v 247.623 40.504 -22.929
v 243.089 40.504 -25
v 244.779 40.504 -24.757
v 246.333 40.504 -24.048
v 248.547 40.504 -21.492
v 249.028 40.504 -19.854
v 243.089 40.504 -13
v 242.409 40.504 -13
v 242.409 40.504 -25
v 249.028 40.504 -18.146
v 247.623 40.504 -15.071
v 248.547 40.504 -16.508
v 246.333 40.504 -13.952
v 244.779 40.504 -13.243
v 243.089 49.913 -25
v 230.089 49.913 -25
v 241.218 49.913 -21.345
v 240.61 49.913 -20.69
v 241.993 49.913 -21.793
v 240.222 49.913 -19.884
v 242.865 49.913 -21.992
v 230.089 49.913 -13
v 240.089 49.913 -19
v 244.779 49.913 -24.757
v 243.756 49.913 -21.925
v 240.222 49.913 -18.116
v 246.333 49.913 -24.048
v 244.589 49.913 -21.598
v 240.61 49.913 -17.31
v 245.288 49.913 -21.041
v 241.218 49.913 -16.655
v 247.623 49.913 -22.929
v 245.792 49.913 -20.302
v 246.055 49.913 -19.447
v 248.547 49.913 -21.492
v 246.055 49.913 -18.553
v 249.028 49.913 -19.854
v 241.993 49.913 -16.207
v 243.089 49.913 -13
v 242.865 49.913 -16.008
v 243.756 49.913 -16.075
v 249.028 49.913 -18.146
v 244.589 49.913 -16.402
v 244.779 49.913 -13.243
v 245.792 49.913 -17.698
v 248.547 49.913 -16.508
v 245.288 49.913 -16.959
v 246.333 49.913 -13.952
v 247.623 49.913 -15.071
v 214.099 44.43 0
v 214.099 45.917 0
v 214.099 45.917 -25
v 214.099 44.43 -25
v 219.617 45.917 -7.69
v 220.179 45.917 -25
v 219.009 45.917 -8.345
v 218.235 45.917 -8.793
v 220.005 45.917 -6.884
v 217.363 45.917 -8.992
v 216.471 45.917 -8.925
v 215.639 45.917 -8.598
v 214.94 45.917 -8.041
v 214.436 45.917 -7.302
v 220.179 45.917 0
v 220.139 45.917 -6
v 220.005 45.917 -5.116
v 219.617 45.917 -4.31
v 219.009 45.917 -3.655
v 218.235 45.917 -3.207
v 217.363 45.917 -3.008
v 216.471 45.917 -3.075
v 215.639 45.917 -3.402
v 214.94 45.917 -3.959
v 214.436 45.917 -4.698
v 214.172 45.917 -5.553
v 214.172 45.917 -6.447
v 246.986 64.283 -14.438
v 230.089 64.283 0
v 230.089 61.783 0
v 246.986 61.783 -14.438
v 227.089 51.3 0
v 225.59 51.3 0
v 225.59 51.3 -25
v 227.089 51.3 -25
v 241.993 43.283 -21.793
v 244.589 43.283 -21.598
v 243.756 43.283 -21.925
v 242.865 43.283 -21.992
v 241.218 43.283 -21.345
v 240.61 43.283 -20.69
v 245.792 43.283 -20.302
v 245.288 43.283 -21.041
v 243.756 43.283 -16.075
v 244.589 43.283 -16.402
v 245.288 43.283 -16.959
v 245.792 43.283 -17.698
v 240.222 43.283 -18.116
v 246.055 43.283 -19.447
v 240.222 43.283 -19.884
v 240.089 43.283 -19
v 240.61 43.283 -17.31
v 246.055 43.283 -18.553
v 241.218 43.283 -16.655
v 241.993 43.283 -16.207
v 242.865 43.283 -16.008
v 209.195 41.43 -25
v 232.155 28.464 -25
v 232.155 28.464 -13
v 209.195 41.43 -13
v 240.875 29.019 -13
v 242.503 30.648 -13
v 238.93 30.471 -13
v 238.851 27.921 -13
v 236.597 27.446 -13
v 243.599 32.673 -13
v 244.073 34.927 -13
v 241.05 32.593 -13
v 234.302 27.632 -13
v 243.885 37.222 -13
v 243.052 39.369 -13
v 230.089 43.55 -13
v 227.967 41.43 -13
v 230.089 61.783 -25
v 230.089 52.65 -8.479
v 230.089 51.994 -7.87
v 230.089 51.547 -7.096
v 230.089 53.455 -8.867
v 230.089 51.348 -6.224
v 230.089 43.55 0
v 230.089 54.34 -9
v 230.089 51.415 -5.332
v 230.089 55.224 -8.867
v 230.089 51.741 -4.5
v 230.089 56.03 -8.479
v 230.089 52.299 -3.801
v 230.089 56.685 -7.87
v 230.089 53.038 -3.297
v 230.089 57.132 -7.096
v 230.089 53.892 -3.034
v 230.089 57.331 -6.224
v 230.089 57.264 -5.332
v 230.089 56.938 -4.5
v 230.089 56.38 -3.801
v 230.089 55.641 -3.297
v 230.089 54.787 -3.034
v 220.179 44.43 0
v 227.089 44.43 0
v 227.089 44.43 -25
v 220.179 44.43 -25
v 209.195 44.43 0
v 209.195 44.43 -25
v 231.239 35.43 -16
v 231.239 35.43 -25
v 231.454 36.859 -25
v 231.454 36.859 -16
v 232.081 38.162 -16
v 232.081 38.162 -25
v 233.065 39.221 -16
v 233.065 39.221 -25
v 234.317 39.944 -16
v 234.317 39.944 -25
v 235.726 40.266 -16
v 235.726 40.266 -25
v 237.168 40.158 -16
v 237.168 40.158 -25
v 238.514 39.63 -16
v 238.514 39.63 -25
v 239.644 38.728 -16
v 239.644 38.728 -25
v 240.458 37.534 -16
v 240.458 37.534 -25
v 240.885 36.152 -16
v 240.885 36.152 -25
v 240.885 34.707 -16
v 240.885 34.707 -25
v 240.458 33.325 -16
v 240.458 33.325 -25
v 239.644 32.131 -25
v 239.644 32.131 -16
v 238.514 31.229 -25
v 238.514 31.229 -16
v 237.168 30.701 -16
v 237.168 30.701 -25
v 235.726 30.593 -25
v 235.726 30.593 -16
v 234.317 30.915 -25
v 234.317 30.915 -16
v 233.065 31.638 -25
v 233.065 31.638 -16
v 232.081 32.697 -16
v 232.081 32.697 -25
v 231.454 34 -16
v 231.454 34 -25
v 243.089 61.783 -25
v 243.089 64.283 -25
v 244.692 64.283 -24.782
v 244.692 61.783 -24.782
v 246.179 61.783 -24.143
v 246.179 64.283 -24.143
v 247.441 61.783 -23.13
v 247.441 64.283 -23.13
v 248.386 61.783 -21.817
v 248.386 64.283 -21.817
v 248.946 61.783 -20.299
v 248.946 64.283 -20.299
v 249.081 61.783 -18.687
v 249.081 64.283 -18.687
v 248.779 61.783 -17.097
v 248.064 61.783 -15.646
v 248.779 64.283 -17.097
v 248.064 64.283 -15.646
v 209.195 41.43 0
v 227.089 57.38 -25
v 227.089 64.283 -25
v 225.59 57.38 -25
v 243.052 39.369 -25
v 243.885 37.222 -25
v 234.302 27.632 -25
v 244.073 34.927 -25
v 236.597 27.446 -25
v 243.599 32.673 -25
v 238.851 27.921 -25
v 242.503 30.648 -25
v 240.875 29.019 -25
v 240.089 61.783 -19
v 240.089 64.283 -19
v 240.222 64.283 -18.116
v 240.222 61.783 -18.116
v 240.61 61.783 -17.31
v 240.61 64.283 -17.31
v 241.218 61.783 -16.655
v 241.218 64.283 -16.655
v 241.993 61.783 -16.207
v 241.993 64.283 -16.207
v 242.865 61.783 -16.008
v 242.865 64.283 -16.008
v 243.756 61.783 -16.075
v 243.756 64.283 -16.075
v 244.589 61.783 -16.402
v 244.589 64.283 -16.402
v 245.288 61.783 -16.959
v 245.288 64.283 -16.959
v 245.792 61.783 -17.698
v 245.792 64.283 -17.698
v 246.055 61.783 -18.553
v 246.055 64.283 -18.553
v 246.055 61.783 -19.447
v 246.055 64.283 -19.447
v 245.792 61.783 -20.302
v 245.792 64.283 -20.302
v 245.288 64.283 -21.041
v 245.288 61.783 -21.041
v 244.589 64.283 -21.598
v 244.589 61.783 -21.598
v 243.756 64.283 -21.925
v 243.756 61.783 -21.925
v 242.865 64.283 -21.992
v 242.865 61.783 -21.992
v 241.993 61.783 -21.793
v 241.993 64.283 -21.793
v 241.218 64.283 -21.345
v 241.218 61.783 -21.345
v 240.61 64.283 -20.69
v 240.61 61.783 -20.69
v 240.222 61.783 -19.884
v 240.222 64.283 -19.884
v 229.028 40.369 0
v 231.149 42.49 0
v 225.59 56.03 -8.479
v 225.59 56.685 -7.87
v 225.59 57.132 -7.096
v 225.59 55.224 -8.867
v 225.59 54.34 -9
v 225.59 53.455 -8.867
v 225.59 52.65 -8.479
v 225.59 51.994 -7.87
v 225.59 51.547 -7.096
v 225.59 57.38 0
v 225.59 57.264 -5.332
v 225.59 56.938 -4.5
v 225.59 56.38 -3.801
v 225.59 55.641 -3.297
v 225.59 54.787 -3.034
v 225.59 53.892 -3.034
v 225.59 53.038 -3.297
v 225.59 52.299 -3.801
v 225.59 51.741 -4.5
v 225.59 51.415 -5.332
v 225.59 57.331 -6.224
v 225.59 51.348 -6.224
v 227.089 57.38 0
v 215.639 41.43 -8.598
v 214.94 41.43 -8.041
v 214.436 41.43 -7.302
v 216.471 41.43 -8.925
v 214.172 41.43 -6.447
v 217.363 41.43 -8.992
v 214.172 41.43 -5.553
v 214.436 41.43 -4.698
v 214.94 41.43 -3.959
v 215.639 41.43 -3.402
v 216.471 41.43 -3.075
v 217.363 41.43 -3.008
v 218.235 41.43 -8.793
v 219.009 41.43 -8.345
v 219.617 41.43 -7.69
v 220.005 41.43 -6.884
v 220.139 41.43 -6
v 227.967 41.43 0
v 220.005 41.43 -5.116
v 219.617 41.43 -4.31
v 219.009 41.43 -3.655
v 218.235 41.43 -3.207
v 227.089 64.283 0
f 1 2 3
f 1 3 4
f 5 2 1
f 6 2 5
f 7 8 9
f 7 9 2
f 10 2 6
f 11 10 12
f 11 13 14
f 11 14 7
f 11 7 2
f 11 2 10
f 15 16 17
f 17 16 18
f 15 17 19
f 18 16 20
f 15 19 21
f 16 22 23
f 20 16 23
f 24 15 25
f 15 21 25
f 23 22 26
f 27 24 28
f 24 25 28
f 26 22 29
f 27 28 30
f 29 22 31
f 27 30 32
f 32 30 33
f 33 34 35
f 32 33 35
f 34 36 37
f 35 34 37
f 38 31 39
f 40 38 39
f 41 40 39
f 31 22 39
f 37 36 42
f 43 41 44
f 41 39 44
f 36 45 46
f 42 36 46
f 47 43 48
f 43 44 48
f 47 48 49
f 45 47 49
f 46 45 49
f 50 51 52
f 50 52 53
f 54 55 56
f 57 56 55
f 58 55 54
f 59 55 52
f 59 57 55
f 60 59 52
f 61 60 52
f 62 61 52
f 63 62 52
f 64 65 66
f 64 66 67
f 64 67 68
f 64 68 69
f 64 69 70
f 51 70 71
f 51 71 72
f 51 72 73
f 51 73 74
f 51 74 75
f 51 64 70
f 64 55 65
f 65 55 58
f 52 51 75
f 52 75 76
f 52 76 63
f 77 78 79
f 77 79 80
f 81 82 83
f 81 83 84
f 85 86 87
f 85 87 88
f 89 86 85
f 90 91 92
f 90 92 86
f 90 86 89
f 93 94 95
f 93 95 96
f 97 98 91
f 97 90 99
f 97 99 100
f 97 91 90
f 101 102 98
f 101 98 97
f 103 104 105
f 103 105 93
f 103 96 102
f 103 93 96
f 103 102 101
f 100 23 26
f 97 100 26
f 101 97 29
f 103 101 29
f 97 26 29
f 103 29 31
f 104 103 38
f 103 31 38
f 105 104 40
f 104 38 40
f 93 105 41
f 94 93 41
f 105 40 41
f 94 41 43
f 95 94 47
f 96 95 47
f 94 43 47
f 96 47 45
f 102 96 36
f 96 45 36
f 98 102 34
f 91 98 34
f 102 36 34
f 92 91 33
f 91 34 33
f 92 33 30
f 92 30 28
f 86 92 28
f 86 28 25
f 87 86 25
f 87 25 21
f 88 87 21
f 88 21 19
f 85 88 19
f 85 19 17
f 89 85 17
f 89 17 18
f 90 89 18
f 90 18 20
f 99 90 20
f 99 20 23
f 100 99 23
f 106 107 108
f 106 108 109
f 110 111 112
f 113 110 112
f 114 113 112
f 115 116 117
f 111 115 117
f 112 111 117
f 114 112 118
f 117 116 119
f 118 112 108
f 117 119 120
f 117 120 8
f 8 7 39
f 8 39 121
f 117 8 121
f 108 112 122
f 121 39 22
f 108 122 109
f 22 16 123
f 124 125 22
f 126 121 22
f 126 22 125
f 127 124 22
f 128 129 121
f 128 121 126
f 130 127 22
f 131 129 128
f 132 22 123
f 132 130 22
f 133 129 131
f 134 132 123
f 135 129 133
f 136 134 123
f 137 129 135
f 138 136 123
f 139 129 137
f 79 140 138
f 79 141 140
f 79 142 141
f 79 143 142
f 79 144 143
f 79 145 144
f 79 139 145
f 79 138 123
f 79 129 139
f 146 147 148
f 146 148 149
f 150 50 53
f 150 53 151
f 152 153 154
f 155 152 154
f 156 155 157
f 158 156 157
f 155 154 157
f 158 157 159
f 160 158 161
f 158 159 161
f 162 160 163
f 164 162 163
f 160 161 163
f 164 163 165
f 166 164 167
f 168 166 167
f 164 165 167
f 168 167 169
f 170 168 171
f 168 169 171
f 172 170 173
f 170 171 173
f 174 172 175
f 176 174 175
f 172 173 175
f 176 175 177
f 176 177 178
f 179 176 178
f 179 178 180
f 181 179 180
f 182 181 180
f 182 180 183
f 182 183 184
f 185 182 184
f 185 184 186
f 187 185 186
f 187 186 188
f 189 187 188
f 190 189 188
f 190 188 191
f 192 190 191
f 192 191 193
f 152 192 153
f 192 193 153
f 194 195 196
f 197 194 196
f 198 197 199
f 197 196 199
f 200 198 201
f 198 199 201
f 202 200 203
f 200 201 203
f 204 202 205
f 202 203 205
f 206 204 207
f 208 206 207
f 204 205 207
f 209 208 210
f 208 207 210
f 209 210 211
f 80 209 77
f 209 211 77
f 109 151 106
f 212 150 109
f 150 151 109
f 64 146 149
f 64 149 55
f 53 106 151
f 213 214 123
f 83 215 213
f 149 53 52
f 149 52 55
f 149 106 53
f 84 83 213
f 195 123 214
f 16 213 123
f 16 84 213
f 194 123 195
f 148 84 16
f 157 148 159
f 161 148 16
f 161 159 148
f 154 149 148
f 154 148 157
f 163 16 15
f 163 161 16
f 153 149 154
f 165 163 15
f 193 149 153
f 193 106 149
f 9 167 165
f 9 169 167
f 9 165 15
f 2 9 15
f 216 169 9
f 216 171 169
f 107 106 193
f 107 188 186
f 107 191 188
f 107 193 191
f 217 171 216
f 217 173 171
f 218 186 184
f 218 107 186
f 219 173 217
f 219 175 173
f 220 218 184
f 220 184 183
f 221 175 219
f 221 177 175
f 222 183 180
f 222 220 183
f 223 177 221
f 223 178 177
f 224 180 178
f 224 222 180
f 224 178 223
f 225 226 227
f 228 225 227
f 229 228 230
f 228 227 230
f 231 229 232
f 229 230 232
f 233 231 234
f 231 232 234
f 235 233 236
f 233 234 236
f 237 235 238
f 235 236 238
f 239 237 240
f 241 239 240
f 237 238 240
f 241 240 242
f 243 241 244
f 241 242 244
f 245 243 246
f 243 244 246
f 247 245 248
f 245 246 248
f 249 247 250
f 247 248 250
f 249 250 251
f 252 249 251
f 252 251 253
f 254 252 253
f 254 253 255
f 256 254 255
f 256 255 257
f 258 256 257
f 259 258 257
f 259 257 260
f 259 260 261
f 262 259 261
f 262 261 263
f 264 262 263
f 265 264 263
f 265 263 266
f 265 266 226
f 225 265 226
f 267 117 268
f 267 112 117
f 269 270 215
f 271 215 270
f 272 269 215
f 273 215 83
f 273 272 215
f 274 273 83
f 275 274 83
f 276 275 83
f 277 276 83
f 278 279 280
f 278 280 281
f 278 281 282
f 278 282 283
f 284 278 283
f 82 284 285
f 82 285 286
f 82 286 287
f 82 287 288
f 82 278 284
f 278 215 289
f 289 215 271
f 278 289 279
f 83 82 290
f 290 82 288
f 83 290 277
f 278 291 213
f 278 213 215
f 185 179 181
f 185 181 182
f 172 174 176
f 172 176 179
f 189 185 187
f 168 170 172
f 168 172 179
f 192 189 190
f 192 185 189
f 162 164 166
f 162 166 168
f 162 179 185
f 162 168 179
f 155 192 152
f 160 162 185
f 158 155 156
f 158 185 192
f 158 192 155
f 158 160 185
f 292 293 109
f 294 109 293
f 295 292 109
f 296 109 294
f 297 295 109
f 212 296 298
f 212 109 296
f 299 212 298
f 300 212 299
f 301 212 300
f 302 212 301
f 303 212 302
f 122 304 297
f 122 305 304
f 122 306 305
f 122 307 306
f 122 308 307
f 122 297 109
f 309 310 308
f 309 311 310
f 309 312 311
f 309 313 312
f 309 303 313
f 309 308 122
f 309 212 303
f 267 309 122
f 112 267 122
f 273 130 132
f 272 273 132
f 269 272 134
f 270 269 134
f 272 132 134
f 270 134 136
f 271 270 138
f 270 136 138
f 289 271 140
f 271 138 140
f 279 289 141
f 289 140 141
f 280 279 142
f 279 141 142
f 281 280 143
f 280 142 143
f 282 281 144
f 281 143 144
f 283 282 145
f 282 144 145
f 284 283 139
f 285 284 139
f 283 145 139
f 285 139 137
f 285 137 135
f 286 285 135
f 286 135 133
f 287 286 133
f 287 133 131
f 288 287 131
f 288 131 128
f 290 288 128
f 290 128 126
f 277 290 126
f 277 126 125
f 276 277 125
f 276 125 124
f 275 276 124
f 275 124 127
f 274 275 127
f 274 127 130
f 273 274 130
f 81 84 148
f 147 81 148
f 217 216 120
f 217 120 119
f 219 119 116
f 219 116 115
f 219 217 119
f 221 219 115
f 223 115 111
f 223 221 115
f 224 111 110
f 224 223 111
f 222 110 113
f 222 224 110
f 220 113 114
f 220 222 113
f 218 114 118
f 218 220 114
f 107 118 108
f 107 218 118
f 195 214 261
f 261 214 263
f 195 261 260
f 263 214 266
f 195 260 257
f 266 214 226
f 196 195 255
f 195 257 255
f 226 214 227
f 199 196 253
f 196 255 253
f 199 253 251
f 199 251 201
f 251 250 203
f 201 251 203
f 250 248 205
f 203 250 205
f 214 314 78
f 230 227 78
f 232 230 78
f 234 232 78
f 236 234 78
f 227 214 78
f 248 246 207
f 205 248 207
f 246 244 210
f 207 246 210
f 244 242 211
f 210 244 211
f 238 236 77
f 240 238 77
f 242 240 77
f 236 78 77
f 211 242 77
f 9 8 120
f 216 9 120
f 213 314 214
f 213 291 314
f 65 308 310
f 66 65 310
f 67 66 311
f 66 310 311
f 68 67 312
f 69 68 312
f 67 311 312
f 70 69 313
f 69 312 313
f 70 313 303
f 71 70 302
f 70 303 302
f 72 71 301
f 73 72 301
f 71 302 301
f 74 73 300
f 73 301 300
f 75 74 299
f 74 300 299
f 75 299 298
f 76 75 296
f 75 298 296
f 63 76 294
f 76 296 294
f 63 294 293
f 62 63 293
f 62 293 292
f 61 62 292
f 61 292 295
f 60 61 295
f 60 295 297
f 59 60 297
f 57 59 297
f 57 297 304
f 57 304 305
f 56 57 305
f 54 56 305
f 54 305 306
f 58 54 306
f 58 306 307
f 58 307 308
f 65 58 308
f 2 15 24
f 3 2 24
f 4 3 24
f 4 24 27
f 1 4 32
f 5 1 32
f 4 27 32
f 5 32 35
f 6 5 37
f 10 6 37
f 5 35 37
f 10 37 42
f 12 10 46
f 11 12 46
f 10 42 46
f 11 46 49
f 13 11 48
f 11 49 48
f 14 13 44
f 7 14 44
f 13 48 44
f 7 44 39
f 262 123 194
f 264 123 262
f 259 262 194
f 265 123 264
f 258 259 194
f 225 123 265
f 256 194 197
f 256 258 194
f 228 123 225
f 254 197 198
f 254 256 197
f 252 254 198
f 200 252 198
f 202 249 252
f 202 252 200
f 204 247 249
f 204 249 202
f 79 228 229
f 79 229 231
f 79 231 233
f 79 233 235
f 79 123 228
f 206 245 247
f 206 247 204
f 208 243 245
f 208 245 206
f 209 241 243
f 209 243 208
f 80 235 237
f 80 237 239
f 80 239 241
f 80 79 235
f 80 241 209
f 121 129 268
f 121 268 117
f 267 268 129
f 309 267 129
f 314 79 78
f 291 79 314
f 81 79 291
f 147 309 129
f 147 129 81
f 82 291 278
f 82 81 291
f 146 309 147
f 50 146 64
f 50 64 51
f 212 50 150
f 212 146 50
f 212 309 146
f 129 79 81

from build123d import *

# Parameters (mm, degrees)
BOSS_EXTRUDE1_DEPTH      = 25
SKETCH2_R                = 3
CUT_EXTRUDE1_DEPTH       = 15
SKETCH3_R                = 3
CUT_EXTRUDE2_DEPTH       = 15
BOSS_EXTRUDE2_DEPTH      = 12
BOSS_EXTRUDE4_DEPTH      = 1.5
SKETCH6_R                = 4.85
CUT_EXTRUDE3_DEPTH       = 9
BOSS_EXTRUDE5_DEPTH      = 2
BOSS_EXTRUDE5_DEPTH_BACK = 0.5
BOSS_EXTRUDE6_START      = -21.77874333
BOSS_EXTRUDE6_DEPTH      = 9.40874333
BOSS_EXTRUDE7_START      = -2.5
BOSS_EXTRUDE7_DEPTH      = 2.5
SKETCH10_R               = 3
CUT_EXTRUDE4_DEPTH       = 21


with BuildPart() as part:
    # Sketch1 → Boss-Extrude1 (new body)
    with BuildSketch(Plane.XY):
        Polygon((227.088719843, 62.282971172), (227.088719843, 57.379571172), (225.590119843, 57.379571172), (225.590119843, 51.299571172), (227.088719843, 51.299571172), (227.088719843, 44.429550862), (220.178702595, 44.429550862), (220.178702595, 45.917195068), (214.098687419, 45.917195068), (214.098687419, 44.429550862), (209.19527518, 44.429550862), (209.19527518, 41.429550862), (230.088719843, 41.429550862), (230.088719843, 62.282971172), align=None)
    extrude(amount=-BOSS_EXTRUDE1_DEPTH)

    # Sketch2 → Cut-Extrude1 (cut)
    with BuildSketch(Plane(origin=(230.088719843, 0, 0), x_dir=(0, 0, -1), z_dir=(1, 0, 0))):
        with Locations((6, 54.339571172)):
            Circle(SKETCH2_R)
    extrude(amount=-CUT_EXTRUDE1_DEPTH, mode=Mode.SUBTRACT)

    # Sketch3 → Cut-Extrude2 (cut)
    with BuildSketch(Plane.XZ.offset(-41.429550862)):
        with Locations((217.138695007, -6)):
            Circle(SKETCH3_R)
    extrude(amount=-CUT_EXTRUDE2_DEPTH, mode=Mode.SUBTRACT)

    # Sketch4 → Boss-Extrude2 (add)
    with BuildSketch(Plane(origin=(0, 0, -25), x_dir=(-1, 0, 0), z_dir=(0, 0, -1))):
        with BuildLine():
            Line((-237.925828106, 48.429550862), (-243.051733392, 39.368642422))
            ThreePointArc((-243.051733392, 39.368642422), (-241.747687926, 29.774811236), (-232.154834185, 28.463594817))
            Line((-232.154834185, 28.463594817), (-209.19527518, 41.429550862))
            Line((-209.19527518, 41.429550862), (-230.088719843, 41.429550862))
            Line((-230.088719843, 41.429550862), (-230.088719843, 48.429550862))
            Line((-230.088719843, 48.429550862), (-237.925828106, 48.429550862))
        make_face()
    extrude(amount=-BOSS_EXTRUDE2_DEPTH)

    # Sketch5 → Boss-Extrude4 (add, symmetric)
    with BuildSketch(Plane(origin=(135.717402312, 135.766641949, 0), x_dir=(0.7072350190117405, -0.7069785201004788, 0), z_dir=(-0.7069785201004788, -0.7072350190117405, 0))):
        Polygon((133.436997596, -13), (147.436997596, -13), (133.436997596, 0), (129.194356979, 0), (129.194356979, -13), align=None)
    extrude(amount=BOSS_EXTRUDE4_DEPTH, both=True)

    # Sketch6 → Cut-Extrude3 (cut)
    with BuildSketch(Plane(origin=(0, 0, -25), x_dir=(-1, 0, 0), z_dir=(0, 0, -1))):
        with Locations((-236.088719843, 35.429550862)):
            Circle(SKETCH6_R)
    extrude(amount=-CUT_EXTRUDE3_DEPTH, mode=Mode.SUBTRACT)

    # Sketch8 → Boss-Extrude5 (add, two sides: drawn at the far end of the back side and taken through both)
    with BuildSketch(Plane(origin=(0, 62.282971172, 0), x_dir=(-1, 0, 0), z_dir=(0, 1, 0)).offset(-BOSS_EXTRUDE5_DEPTH_BACK)):
        with BuildLine():
            Line((-227.088719843, -25), (-243.088719843, -25))
            ThreePointArc((-243.088719843, -25), (-249.088719843, -19), (-243.088719843, -13))
            Line((-243.088719843, -13), (-227.088719843, -13))
            Line((-227.088719843, -13), (-227.088719843, -25))
        make_face()
    extrude(amount=BOSS_EXTRUDE5_DEPTH + BOSS_EXTRUDE5_DEPTH_BACK)

    # Sketch8<2> → Boss-Extrude6 (add)
    with BuildSketch(Plane(origin=(0, 62.282971172, 0), x_dir=(-1, 0, 0), z_dir=(0, 1, 0)).offset(BOSS_EXTRUDE6_START)):
        with BuildLine():
            Line((-227.088719843, -25), (-243.088719843, -25))
            ThreePointArc((-243.088719843, -25), (-249.088719843, -19), (-243.088719843, -13))
            Line((-243.088719843, -13), (-227.088719843, -13))
            Line((-227.088719843, -13), (-227.088719843, -25))
        make_face()
    extrude(amount=BOSS_EXTRUDE6_DEPTH)

    # Sketch9 → Boss-Extrude7 (add)
    with BuildSketch(Plane(origin=(0, 64.282971172, 0), x_dir=(-1, 0, 0), z_dir=(0, 1, 0)).offset(BOSS_EXTRUDE7_START)):
        with BuildLine():
            Line((-227.088719843, -13), (-227.088719843, 0))
            Line((-227.088719843, 0), (-230.088719843, 0))
            Line((-230.088719843, 0), (-246.986411594, -14.438421434))
            ThreePointArc((-246.986411594, -14.438421434), (-245.166041268, -13.371080415), (-243.088719843, -13))
            Line((-243.088719843, -13), (-227.088719843, -13))
        make_face()
    extrude(amount=BOSS_EXTRUDE7_DEPTH)

    # Sketch10 → Cut-Extrude4 (cut)
    with BuildSketch(Plane(origin=(0, 64.282971172, 0), x_dir=(-1, 0, 0), z_dir=(0, 1, 0))):
        with Locations((-243.088719843, -19)):
            Circle(SKETCH10_R)
    extrude(amount=-CUT_EXTRUDE4_DEPTH, mode=Mode.SUBTRACT)


solid = part.part
